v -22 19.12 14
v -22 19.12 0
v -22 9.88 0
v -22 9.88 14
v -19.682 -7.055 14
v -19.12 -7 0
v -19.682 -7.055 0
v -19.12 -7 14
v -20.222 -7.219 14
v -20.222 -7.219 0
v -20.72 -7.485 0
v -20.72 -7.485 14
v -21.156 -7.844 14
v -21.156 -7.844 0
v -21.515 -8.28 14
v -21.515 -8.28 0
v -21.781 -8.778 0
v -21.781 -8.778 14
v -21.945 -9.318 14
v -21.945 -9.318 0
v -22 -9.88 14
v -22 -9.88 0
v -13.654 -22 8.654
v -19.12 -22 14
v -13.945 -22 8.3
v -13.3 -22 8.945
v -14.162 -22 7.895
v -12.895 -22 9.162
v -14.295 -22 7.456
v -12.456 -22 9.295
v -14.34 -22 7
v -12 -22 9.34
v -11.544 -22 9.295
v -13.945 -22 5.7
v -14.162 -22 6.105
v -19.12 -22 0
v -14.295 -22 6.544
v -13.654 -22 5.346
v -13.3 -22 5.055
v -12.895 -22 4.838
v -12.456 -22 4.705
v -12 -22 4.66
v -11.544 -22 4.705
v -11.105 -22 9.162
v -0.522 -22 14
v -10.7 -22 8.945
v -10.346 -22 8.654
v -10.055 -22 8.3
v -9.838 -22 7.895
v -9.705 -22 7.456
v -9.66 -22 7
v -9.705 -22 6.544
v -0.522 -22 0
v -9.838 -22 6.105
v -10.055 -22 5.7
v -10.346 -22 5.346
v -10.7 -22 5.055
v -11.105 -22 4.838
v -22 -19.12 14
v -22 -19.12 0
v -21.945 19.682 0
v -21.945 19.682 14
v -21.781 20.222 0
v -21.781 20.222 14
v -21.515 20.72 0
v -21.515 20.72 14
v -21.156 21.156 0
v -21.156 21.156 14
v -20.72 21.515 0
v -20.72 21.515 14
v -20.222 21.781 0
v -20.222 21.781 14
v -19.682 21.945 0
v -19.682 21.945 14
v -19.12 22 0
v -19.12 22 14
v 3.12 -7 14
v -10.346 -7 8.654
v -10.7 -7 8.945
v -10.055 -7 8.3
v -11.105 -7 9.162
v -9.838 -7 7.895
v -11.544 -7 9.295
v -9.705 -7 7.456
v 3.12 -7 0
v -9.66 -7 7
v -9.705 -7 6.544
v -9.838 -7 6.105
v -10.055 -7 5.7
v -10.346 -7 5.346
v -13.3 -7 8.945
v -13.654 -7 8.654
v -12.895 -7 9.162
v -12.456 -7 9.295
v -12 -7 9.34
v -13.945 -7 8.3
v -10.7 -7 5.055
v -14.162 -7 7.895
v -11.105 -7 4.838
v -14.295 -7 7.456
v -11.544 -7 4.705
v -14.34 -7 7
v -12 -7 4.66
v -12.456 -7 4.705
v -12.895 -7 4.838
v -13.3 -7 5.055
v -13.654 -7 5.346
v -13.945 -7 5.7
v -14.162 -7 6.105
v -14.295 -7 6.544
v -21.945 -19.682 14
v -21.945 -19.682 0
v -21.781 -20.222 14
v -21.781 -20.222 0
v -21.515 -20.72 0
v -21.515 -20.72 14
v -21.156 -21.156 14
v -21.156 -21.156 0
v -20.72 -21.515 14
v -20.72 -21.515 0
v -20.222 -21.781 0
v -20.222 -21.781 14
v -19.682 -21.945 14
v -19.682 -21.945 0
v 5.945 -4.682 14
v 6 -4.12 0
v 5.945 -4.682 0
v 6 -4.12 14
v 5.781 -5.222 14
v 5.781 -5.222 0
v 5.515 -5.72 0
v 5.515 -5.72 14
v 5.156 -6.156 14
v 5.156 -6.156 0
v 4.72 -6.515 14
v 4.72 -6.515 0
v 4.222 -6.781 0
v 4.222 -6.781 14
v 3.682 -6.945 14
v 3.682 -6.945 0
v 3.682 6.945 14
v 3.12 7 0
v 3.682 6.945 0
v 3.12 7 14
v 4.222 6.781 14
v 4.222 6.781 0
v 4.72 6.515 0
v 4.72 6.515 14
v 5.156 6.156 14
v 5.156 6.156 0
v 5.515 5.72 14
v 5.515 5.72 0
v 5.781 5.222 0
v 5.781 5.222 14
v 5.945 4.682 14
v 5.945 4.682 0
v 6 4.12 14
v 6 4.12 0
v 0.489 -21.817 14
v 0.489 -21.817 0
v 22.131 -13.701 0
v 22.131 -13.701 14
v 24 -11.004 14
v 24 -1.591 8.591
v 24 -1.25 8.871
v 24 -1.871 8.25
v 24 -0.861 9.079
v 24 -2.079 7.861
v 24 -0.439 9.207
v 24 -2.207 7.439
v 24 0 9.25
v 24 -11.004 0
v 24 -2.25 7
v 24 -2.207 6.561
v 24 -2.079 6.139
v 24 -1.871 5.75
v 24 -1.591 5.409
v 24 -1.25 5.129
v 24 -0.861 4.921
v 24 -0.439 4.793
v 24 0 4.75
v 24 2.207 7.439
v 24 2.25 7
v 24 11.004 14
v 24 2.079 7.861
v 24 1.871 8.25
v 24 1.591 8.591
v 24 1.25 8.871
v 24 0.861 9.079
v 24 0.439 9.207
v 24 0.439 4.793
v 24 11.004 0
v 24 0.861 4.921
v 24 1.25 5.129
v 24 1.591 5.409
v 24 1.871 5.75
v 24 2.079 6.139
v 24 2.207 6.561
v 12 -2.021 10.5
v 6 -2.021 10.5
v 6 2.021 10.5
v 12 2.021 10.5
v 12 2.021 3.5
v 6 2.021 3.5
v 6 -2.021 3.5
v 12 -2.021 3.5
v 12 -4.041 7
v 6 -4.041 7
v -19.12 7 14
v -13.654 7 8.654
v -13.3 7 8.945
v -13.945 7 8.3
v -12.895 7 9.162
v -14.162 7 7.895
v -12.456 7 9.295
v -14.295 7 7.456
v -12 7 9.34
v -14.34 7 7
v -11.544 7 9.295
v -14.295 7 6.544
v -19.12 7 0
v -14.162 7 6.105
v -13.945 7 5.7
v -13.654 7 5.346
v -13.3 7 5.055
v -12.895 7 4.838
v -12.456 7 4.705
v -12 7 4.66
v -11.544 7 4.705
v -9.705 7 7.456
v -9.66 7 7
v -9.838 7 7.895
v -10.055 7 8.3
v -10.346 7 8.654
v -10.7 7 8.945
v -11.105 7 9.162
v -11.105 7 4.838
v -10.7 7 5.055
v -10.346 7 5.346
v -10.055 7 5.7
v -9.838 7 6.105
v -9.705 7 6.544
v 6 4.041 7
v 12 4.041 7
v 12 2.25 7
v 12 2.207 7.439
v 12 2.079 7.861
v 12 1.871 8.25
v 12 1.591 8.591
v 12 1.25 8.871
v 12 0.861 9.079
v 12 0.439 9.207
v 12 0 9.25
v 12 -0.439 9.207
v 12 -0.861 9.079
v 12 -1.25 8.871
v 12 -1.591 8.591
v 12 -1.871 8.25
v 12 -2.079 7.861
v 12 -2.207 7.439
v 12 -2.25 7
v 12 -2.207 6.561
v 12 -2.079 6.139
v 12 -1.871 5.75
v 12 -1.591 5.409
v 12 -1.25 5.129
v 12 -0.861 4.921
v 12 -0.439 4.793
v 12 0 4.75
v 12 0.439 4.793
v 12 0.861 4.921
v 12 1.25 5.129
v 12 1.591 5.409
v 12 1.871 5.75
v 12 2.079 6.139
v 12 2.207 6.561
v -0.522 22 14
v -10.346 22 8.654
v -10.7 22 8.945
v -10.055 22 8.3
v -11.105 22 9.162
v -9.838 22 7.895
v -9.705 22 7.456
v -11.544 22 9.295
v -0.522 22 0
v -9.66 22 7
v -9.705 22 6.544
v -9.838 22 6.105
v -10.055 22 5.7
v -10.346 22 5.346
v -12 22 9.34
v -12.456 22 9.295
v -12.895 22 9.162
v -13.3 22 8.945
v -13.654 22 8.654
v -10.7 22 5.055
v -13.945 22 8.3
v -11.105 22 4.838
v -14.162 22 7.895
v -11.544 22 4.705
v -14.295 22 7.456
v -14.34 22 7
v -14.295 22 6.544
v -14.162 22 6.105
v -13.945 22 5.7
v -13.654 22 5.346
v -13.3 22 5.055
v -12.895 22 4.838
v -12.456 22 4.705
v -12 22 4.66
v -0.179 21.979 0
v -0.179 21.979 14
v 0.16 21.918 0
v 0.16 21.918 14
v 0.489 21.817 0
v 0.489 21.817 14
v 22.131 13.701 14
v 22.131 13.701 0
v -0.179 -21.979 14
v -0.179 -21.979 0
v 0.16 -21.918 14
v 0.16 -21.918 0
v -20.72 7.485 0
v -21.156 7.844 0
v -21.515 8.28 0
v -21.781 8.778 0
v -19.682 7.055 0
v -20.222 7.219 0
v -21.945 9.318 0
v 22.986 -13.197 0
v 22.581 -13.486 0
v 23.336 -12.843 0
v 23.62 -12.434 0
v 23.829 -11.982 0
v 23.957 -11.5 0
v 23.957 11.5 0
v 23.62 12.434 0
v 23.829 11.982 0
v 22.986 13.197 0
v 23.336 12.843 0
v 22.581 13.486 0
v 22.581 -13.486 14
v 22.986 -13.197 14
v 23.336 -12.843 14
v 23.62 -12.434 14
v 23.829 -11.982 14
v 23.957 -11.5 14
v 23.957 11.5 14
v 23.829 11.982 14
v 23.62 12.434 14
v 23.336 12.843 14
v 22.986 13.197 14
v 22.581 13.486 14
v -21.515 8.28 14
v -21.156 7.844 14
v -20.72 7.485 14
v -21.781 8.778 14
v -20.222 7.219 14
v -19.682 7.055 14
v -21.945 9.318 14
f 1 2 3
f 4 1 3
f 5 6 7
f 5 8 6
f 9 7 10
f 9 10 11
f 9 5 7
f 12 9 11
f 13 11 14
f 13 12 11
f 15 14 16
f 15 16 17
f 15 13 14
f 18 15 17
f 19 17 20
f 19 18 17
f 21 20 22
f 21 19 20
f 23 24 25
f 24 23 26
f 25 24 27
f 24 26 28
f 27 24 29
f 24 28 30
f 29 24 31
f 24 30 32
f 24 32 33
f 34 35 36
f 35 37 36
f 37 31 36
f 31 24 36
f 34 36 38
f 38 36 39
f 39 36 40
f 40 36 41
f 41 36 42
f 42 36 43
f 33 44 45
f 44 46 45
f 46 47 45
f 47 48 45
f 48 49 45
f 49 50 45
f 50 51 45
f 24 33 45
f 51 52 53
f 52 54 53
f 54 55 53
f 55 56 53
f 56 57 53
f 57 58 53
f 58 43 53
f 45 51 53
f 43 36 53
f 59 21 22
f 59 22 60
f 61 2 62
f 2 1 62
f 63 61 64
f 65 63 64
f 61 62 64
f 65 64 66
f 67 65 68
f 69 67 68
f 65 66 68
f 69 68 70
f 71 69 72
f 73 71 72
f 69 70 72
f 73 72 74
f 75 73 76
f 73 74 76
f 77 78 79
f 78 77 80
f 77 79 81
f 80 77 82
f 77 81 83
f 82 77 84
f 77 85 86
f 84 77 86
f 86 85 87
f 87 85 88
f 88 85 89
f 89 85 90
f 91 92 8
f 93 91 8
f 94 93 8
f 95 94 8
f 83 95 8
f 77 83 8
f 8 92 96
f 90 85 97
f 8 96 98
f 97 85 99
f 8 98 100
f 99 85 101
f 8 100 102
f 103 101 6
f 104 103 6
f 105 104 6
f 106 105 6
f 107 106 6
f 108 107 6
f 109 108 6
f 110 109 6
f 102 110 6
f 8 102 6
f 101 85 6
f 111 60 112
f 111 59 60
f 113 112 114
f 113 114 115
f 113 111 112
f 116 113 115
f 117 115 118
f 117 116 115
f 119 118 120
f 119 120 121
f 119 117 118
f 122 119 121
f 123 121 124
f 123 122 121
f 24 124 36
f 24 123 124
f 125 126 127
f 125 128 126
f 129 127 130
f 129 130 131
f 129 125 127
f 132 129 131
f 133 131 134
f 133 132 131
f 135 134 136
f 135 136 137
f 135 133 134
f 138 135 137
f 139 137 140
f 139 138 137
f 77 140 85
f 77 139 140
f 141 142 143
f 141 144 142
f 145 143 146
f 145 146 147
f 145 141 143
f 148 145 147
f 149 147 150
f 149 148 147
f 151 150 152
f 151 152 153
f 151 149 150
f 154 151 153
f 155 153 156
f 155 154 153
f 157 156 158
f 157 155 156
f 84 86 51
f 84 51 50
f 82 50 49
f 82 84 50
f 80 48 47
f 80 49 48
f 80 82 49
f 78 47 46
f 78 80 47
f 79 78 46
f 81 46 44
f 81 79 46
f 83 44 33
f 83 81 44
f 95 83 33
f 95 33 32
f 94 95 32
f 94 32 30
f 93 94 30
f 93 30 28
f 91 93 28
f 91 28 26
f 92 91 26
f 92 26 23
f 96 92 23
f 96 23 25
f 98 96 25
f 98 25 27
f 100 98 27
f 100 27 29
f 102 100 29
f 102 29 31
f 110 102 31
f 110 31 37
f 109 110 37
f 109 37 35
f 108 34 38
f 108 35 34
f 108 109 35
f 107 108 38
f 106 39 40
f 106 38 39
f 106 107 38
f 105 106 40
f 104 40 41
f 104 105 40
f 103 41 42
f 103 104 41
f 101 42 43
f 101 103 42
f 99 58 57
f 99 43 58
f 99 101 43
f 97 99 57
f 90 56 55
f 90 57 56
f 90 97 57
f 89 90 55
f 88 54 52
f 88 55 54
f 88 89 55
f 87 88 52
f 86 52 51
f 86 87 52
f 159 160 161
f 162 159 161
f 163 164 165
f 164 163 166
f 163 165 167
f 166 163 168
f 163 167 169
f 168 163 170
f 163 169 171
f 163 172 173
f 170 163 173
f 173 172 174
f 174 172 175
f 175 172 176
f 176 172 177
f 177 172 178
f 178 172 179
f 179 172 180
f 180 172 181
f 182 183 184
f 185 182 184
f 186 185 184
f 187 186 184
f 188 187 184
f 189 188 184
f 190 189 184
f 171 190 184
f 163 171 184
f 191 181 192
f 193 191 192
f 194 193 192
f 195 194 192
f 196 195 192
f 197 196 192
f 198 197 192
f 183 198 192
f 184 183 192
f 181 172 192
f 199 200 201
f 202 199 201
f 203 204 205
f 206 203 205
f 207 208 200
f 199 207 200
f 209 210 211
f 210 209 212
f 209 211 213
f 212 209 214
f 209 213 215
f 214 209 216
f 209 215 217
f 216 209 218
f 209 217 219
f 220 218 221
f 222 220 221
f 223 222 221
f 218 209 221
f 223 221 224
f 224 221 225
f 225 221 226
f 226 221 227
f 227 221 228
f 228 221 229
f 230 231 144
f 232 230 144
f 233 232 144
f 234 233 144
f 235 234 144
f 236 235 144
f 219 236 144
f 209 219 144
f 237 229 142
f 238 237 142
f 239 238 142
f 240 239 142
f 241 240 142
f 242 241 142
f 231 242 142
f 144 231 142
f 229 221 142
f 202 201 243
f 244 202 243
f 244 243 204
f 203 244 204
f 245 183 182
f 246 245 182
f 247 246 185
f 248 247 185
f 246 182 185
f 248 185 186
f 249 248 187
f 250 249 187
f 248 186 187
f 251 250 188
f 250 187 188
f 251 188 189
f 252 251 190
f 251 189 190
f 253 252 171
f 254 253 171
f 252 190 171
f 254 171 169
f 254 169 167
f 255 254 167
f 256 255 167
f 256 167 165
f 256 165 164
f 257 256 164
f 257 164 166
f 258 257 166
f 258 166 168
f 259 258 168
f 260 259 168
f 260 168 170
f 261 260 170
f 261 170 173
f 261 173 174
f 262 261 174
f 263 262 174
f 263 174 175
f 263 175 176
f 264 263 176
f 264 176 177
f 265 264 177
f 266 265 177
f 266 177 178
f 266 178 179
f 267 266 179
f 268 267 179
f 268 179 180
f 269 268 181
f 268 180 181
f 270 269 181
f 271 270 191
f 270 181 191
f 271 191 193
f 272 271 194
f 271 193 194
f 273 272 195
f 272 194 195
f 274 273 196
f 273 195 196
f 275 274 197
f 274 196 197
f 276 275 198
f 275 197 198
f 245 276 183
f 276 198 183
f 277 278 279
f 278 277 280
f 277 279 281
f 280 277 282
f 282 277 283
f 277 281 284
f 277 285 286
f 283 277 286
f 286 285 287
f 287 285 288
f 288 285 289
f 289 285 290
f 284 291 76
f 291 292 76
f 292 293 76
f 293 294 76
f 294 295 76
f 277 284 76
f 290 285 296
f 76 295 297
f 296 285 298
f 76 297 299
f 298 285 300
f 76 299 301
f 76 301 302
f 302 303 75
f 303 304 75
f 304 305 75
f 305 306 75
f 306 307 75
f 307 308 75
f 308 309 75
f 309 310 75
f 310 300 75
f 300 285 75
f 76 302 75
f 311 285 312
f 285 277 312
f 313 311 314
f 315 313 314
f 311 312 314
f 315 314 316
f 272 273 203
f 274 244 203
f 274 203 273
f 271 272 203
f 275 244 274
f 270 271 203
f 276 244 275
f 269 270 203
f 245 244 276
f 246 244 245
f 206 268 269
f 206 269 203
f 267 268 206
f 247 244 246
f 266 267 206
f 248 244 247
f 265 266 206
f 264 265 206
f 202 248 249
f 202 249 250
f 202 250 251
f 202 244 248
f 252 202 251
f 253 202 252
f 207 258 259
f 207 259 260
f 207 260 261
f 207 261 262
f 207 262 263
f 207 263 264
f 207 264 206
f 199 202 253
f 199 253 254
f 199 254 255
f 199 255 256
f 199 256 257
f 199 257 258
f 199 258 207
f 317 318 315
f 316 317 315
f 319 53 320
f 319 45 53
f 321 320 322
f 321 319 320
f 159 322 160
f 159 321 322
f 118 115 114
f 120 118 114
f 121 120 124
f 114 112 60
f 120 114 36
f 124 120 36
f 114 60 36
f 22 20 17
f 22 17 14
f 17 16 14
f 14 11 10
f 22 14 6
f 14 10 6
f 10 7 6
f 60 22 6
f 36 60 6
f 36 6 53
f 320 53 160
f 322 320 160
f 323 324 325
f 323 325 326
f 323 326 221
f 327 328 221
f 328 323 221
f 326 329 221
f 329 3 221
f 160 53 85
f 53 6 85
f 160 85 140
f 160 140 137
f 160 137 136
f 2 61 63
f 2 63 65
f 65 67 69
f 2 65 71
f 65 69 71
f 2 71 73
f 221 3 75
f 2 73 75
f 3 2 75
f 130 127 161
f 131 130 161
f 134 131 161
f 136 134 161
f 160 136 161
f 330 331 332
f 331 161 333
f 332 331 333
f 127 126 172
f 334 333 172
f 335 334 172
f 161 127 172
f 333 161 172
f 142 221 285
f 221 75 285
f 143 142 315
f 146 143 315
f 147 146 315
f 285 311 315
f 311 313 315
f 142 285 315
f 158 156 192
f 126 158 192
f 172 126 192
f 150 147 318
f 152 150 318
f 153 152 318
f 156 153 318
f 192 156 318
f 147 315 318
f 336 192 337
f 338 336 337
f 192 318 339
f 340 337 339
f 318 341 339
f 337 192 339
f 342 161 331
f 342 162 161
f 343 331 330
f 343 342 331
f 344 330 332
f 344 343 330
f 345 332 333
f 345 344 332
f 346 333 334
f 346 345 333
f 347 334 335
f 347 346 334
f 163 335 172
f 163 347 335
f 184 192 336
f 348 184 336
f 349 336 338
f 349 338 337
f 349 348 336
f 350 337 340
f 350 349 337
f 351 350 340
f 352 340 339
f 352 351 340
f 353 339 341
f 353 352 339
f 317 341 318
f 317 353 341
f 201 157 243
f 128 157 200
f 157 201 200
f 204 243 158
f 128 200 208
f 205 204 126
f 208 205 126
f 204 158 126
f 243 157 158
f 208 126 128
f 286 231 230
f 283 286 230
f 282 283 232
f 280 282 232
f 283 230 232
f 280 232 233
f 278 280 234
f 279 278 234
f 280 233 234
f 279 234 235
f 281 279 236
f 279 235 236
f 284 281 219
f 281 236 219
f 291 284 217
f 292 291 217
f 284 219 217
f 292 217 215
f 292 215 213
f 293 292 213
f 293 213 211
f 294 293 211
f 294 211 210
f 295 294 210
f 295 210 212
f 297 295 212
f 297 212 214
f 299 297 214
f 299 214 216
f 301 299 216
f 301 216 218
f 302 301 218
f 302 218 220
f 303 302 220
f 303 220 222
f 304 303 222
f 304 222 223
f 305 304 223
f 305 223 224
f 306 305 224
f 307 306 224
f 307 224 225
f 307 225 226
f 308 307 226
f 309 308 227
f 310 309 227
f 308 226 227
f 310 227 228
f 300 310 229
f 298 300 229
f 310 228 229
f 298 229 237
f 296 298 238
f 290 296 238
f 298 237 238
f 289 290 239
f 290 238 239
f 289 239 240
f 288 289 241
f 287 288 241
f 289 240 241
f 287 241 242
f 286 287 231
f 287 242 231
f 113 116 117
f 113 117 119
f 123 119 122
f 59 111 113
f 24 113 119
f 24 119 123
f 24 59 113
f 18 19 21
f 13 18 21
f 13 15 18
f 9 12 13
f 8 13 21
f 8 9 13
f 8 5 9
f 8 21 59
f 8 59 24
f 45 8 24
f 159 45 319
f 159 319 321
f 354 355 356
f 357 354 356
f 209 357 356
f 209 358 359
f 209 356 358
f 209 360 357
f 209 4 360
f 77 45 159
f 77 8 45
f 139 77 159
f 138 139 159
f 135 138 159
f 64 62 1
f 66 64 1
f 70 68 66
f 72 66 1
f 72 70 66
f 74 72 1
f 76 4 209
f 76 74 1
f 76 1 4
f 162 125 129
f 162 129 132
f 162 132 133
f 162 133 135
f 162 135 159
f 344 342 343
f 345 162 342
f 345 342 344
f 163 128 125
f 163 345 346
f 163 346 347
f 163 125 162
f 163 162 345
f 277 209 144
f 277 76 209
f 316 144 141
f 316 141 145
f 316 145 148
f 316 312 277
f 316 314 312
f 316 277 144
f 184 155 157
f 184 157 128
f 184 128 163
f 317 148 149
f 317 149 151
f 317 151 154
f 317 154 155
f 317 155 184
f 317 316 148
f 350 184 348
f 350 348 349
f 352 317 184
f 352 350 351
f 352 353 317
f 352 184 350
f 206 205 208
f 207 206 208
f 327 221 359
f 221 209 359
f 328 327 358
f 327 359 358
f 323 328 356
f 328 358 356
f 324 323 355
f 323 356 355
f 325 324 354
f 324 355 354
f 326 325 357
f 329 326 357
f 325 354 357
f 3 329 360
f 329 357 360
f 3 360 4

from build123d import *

# Parameters (mm, degrees)
PAD_DEPTH            = 14
POCKET_DEPTH         = 6
SKETCH002_R          = 2.25
POCKET001_DEPTH      = 46.001
SKETCH003_R          = 2.339712
POCKET002_DEPTH      = 1000
POCKET002_DEPTH_BACK = -100
FILLET_R             = 2.88


with BuildPart() as part:
    # Sketch → Pad (new body)
    with BuildSketch(Plane.XY):
        Polygon((-22, 7), (6, 7), (6, -7), (-22, -7), (-22, -22), (0, -22), (24, -13), (24, 13), (0, 22), (-22, 22), align=None)
    extrude(amount=PAD_DEPTH)

    # Sketch001 (on Face2 of Pad) → Pocket (cut)
    with BuildSketch(Plane(origin=(6, 0, 0), x_dir=(0, -1, 0), z_dir=(-1, 0, 0))):
        Polygon((-2.020726, 3.5), (2.020726, 3.5), (4.041452, 7), (2.020726, 10.5), (-2.020726, 10.5), (-4.041452, 7), align=None)
    extrude(amount=-POCKET_DEPTH, mode=Mode.SUBTRACT)

    # Sketch002 (on Face17 of Pocket) → Pocket001 (cut, through all)
    with BuildSketch(Plane.YZ.offset(24)):
        with Locations((0, 7)):
            Circle(SKETCH002_R)
    extrude(amount=-POCKET001_DEPTH, mode=Mode.SUBTRACT)

    # Sketch003 (on Face1 of Pocket001) → Pocket002 (cut, two sides)
    with BuildSketch(Plane.XZ.offset(-7)) as pocket002_sk:
        with Locations((-12, 7)):
            Circle(SKETCH003_R)
    extrude(amount=-POCKET002_DEPTH, mode=Mode.SUBTRACT)
    extrude(pocket002_sk.sketch, amount=-POCKET002_DEPTH_BACK, mode=Mode.SUBTRACT)

    # Fillet
    fillet_edges = [part.edges().sort_by_distance(p)[0] for p in [
        (6, -7, 7),
        (6, 7, 7),
        (-22, -7, 7),
        (-22, -22, 7),
        (0, -22, 7),
        (24, -13, 7),
        (24, 13, 7),
        (0, 22, 7),
        (-22, 22, 7),
        (-22, 7, 7),
    ]]
    fillet(fillet_edges, radius=FILLET_R)


solid = part.part
